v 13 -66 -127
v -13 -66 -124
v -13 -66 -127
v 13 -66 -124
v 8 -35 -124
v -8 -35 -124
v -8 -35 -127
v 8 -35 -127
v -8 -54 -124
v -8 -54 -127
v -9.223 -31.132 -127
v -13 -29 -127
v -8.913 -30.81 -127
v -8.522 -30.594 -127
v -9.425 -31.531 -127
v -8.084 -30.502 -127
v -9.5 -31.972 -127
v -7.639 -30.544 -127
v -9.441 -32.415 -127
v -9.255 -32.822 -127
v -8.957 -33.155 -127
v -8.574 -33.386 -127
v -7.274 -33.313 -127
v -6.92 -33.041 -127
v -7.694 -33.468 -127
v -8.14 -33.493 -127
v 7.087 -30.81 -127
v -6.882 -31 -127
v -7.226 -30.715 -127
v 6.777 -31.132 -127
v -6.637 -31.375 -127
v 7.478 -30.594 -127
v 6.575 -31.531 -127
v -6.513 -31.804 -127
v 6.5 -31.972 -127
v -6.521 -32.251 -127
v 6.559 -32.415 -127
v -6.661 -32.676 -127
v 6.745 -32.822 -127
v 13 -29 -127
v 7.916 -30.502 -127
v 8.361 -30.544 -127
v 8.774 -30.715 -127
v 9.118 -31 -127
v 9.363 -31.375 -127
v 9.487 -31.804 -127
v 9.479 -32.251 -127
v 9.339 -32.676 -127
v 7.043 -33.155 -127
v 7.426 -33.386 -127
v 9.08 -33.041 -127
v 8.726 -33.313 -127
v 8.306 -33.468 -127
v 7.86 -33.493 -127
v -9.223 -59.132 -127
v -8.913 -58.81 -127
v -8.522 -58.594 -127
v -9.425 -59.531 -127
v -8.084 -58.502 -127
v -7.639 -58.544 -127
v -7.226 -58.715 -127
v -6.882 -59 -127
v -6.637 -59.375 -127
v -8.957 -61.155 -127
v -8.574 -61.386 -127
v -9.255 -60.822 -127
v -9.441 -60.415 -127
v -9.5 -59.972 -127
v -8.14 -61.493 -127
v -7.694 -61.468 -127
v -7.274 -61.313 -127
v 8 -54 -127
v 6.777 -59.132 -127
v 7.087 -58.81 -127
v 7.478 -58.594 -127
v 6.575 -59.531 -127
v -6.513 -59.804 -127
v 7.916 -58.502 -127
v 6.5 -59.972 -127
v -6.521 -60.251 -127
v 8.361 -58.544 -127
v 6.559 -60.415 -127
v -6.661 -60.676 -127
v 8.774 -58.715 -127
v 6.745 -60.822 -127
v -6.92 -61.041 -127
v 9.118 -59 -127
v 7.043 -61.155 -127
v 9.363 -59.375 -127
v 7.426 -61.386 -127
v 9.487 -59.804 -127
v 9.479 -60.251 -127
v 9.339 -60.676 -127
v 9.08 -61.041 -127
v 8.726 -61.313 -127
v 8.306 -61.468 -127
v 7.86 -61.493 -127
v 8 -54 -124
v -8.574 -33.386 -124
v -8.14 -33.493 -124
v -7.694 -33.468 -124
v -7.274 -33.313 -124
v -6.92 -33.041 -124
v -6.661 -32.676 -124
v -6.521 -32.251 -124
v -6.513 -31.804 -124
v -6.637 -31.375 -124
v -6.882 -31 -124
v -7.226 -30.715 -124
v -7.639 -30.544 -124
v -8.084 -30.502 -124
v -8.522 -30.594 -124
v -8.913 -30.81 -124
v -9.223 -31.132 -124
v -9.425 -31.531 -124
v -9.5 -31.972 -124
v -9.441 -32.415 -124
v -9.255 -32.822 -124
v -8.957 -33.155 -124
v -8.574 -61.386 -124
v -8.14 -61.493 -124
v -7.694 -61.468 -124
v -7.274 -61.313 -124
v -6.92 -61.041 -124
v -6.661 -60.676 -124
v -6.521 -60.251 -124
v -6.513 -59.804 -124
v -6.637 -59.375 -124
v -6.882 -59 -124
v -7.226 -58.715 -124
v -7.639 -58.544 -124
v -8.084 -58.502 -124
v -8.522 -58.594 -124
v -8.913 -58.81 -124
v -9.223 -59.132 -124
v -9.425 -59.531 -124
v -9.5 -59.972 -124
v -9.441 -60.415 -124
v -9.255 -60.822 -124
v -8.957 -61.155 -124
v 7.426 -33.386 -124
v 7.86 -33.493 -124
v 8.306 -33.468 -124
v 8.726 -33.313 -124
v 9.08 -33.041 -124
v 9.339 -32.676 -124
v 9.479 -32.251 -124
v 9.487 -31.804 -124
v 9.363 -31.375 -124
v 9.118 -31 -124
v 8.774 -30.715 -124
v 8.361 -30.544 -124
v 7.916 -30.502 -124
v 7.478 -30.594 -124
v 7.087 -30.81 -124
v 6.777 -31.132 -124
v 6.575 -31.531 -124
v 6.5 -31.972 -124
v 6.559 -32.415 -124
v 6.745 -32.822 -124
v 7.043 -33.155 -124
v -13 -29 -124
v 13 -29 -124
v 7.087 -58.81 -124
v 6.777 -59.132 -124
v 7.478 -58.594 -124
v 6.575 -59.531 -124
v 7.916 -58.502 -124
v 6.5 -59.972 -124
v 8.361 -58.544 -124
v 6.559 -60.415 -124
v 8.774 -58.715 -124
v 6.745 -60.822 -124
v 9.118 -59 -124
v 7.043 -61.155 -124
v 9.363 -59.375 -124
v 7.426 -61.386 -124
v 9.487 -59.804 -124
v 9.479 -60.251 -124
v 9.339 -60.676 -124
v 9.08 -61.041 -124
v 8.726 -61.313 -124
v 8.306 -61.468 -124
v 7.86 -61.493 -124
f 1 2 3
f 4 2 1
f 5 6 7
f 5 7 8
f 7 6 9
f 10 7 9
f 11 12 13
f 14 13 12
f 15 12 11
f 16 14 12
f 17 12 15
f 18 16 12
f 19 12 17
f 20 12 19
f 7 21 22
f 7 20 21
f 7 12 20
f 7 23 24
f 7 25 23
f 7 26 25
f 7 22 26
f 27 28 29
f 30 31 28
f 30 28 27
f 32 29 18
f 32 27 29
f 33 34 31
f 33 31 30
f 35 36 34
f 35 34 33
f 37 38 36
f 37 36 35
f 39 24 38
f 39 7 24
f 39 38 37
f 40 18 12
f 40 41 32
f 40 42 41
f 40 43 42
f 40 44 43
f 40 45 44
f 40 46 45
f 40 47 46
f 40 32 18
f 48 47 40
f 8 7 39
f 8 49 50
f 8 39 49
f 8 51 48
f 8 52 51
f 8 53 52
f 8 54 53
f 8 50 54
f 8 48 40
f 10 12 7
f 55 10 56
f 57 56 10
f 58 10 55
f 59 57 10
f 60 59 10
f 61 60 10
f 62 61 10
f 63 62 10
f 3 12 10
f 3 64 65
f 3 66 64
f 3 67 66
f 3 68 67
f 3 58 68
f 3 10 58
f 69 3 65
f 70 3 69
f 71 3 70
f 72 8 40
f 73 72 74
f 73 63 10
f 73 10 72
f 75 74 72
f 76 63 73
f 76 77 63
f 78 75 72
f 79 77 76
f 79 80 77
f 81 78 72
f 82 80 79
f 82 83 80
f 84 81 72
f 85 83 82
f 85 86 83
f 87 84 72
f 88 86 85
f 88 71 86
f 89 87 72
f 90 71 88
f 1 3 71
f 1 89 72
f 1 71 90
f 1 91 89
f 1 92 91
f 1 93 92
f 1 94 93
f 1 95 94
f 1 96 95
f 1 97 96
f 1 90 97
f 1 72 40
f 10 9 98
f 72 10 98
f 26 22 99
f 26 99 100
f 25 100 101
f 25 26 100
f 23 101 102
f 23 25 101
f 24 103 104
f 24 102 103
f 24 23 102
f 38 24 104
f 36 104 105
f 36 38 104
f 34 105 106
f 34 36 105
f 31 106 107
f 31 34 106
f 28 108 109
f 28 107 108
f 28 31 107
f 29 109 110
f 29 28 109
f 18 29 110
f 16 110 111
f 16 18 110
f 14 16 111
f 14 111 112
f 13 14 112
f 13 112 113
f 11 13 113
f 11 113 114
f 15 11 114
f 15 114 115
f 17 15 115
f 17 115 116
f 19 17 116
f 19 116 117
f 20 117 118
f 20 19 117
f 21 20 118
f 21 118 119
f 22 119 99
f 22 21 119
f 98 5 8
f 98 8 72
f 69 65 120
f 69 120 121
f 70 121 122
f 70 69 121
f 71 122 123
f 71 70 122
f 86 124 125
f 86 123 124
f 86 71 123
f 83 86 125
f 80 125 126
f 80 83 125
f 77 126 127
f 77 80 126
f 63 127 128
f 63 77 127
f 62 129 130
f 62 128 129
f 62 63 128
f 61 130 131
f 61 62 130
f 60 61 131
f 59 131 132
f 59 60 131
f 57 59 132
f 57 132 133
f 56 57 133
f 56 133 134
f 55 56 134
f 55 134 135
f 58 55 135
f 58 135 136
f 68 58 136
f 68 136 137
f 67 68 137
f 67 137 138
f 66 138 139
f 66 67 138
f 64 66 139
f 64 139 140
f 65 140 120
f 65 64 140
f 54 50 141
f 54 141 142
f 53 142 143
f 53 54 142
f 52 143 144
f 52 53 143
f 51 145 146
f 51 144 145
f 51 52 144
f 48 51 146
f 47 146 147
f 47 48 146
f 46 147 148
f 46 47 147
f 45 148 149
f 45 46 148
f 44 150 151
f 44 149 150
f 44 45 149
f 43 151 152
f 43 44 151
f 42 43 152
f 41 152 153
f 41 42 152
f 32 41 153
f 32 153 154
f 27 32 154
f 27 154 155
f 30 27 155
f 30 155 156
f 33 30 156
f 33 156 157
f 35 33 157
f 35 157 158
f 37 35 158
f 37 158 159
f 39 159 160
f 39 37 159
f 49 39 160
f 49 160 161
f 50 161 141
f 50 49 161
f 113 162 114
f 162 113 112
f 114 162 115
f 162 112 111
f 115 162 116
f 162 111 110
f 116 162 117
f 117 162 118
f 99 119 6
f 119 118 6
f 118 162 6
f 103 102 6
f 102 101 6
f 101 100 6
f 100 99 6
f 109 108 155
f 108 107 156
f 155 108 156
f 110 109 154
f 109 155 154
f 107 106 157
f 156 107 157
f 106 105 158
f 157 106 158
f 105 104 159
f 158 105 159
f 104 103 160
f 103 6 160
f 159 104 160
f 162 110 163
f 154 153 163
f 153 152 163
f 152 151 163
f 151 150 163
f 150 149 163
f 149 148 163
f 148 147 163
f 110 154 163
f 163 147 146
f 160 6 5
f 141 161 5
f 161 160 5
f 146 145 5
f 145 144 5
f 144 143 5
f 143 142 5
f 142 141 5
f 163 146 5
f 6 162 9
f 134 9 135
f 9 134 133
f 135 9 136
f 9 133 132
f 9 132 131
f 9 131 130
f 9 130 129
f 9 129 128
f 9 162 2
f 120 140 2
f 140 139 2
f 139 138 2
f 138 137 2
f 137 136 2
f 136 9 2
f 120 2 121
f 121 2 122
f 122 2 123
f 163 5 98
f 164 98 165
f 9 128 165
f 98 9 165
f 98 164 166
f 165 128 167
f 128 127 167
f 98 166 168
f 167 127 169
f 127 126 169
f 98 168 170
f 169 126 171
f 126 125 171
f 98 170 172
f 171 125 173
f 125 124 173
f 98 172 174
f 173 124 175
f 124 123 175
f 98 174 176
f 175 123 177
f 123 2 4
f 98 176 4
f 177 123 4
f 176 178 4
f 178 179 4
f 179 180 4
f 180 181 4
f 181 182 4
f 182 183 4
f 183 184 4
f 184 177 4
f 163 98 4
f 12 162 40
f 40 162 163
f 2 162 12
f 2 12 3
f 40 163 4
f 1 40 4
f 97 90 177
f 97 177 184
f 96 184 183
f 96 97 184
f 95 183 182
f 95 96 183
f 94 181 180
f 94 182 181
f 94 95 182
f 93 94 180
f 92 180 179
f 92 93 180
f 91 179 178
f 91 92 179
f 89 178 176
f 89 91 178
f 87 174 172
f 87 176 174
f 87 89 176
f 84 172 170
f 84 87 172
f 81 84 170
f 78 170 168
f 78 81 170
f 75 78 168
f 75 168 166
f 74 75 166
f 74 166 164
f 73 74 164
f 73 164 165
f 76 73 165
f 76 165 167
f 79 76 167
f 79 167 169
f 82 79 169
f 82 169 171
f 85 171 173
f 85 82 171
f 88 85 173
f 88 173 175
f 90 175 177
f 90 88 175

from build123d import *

# Parameters (mm, degrees)
CYLINDER1886_R               = 1.5
CYLINDER1886_DEPTH           = 20
CYLINDER1886_PLACEMENT_ANGLE = -112.5
CYLINDER1887_R               = 1.5
CYLINDER1887_DEPTH           = 20
CYLINDER1887_PLACEMENT_ANGLE = 112.5
CYLINDER1889_R               = 1.5
CYLINDER1889_DEPTH           = 20
CYLINDER1889_PLACEMENT_ANGLE = 112.5
CYLINDER1888_R               = 1.5
CYLINDER1888_DEPTH           = 20
CYLINDER1888_PLACEMENT_ANGLE = -112.5
BOX747_W                     = 16
BOX747_H                     = 19
BOX747_DEPTH                 = 3
BOX746_W                     = 26
BOX746_H                     = 37
BOX746_DEPTH                 = 3
CUT684_PLACEMENT_ANGLE       = 180


with BuildPart() as v_lec1886:
    # Cylinder1886 → Cylinder1886 (new body)
    with BuildSketch(Plane.XY):
        Circle(CYLINDER1886_R)
    extrude(amount=CYLINDER1886_DEPTH)


with BuildPart() as v_lec1886_1:
    # Cylinder1886 placement: moved
    add(v_lec1886.part.moved(Location((-8, 34, 51))).rotate(Axis((-8, 34, 51), (0, 0, 1)), CYLINDER1886_PLACEMENT_ANGLE))


with BuildPart() as v_lec1887:
    # Cylinder1887 → Cylinder1887 (new body)
    with BuildSketch(Plane.XY):
        Circle(CYLINDER1887_R)
    extrude(amount=CYLINDER1887_DEPTH)


with BuildPart() as v_lec1887_1:
    # Cylinder1887 placement: moved
    add(v_lec1887.part.moved(Location((8, 62, 51))).rotate(Axis((8, 62, 51), (0, 0, -1)), CYLINDER1887_PLACEMENT_ANGLE))


with BuildPart() as v_lec1889:
    # Cylinder1889 → Cylinder1889 (new body)
    with BuildSketch(Plane.XY):
        Circle(CYLINDER1889_R)
    extrude(amount=CYLINDER1889_DEPTH)


with BuildPart() as v_lec1889_1:
    # Cylinder1889 placement: moved
    add(v_lec1889.part.moved(Location((-8, 62, 51))).rotate(Axis((-8, 62, 51), (0, 0, -1)), CYLINDER1889_PLACEMENT_ANGLE))


with BuildPart() as compound846:
    # Cylinder1888 → Cylinder1888 (new body)
    with BuildSketch(Plane.XY):
        Circle(CYLINDER1888_R)
    extrude(amount=CYLINDER1888_DEPTH)


with BuildPart() as compound846_1:
    # Cylinder1888 placement: moved
    add(compound846.part.moved(Location((8, 34, 51))).rotate(Axis((8, 34, 51), (0, 0, 1)), CYLINDER1888_PLACEMENT_ANGLE))

    # Compound846: union Válec1886, Válec1887, Válec1889
    add(v_lec1886_1.part)
    add(v_lec1887_1.part)
    add(v_lec1889_1.part)


with BuildPart() as compound846_2:
    # Compound846 placement: moved
    add(compound846_1.part.moved(Location((0, -94, -180))))


with BuildPart() as krychle746:
    # Box747 → Box747 (new body)
    with BuildSketch(Plane(origin=(-8, 37, 27), x_dir=(1, 0, 0), z_dir=(0, 0, 1))):
        with Locations((8, 9.5)):
            Rectangle(BOX747_W, BOX747_H)
    extrude(amount=BOX747_DEPTH)


with BuildPart() as cut685:
    # Box746 → Box746 (new body)
    with BuildSketch(Plane(origin=(-13, 31, 27), x_dir=(1, 0, 0), z_dir=(0, 0, 1))):
        with Locations((13, 18.5)):
            Rectangle(BOX746_W, BOX746_H)
    extrude(amount=BOX746_DEPTH)

    # Cut684: cut Krychle746
    add(krychle746.part, mode=Mode.SUBTRACT)


with BuildPart() as cut685_1:
    # Cut684 placement: moved
    add(cut685.part.moved(Location((0, 2, -94))).rotate(Axis((0, 2, -94), (1, 0, 0)), CUT684_PLACEMENT_ANGLE))

    # Cut685: cut Compound846
    add(compound846_2.part, mode=Mode.SUBTRACT)


with BuildPart() as cut685_2:
    # Cut685 placement: moved
    add(cut685_1.part.moved(Location((0, 0, -3))))


solid = cut685_2.part
